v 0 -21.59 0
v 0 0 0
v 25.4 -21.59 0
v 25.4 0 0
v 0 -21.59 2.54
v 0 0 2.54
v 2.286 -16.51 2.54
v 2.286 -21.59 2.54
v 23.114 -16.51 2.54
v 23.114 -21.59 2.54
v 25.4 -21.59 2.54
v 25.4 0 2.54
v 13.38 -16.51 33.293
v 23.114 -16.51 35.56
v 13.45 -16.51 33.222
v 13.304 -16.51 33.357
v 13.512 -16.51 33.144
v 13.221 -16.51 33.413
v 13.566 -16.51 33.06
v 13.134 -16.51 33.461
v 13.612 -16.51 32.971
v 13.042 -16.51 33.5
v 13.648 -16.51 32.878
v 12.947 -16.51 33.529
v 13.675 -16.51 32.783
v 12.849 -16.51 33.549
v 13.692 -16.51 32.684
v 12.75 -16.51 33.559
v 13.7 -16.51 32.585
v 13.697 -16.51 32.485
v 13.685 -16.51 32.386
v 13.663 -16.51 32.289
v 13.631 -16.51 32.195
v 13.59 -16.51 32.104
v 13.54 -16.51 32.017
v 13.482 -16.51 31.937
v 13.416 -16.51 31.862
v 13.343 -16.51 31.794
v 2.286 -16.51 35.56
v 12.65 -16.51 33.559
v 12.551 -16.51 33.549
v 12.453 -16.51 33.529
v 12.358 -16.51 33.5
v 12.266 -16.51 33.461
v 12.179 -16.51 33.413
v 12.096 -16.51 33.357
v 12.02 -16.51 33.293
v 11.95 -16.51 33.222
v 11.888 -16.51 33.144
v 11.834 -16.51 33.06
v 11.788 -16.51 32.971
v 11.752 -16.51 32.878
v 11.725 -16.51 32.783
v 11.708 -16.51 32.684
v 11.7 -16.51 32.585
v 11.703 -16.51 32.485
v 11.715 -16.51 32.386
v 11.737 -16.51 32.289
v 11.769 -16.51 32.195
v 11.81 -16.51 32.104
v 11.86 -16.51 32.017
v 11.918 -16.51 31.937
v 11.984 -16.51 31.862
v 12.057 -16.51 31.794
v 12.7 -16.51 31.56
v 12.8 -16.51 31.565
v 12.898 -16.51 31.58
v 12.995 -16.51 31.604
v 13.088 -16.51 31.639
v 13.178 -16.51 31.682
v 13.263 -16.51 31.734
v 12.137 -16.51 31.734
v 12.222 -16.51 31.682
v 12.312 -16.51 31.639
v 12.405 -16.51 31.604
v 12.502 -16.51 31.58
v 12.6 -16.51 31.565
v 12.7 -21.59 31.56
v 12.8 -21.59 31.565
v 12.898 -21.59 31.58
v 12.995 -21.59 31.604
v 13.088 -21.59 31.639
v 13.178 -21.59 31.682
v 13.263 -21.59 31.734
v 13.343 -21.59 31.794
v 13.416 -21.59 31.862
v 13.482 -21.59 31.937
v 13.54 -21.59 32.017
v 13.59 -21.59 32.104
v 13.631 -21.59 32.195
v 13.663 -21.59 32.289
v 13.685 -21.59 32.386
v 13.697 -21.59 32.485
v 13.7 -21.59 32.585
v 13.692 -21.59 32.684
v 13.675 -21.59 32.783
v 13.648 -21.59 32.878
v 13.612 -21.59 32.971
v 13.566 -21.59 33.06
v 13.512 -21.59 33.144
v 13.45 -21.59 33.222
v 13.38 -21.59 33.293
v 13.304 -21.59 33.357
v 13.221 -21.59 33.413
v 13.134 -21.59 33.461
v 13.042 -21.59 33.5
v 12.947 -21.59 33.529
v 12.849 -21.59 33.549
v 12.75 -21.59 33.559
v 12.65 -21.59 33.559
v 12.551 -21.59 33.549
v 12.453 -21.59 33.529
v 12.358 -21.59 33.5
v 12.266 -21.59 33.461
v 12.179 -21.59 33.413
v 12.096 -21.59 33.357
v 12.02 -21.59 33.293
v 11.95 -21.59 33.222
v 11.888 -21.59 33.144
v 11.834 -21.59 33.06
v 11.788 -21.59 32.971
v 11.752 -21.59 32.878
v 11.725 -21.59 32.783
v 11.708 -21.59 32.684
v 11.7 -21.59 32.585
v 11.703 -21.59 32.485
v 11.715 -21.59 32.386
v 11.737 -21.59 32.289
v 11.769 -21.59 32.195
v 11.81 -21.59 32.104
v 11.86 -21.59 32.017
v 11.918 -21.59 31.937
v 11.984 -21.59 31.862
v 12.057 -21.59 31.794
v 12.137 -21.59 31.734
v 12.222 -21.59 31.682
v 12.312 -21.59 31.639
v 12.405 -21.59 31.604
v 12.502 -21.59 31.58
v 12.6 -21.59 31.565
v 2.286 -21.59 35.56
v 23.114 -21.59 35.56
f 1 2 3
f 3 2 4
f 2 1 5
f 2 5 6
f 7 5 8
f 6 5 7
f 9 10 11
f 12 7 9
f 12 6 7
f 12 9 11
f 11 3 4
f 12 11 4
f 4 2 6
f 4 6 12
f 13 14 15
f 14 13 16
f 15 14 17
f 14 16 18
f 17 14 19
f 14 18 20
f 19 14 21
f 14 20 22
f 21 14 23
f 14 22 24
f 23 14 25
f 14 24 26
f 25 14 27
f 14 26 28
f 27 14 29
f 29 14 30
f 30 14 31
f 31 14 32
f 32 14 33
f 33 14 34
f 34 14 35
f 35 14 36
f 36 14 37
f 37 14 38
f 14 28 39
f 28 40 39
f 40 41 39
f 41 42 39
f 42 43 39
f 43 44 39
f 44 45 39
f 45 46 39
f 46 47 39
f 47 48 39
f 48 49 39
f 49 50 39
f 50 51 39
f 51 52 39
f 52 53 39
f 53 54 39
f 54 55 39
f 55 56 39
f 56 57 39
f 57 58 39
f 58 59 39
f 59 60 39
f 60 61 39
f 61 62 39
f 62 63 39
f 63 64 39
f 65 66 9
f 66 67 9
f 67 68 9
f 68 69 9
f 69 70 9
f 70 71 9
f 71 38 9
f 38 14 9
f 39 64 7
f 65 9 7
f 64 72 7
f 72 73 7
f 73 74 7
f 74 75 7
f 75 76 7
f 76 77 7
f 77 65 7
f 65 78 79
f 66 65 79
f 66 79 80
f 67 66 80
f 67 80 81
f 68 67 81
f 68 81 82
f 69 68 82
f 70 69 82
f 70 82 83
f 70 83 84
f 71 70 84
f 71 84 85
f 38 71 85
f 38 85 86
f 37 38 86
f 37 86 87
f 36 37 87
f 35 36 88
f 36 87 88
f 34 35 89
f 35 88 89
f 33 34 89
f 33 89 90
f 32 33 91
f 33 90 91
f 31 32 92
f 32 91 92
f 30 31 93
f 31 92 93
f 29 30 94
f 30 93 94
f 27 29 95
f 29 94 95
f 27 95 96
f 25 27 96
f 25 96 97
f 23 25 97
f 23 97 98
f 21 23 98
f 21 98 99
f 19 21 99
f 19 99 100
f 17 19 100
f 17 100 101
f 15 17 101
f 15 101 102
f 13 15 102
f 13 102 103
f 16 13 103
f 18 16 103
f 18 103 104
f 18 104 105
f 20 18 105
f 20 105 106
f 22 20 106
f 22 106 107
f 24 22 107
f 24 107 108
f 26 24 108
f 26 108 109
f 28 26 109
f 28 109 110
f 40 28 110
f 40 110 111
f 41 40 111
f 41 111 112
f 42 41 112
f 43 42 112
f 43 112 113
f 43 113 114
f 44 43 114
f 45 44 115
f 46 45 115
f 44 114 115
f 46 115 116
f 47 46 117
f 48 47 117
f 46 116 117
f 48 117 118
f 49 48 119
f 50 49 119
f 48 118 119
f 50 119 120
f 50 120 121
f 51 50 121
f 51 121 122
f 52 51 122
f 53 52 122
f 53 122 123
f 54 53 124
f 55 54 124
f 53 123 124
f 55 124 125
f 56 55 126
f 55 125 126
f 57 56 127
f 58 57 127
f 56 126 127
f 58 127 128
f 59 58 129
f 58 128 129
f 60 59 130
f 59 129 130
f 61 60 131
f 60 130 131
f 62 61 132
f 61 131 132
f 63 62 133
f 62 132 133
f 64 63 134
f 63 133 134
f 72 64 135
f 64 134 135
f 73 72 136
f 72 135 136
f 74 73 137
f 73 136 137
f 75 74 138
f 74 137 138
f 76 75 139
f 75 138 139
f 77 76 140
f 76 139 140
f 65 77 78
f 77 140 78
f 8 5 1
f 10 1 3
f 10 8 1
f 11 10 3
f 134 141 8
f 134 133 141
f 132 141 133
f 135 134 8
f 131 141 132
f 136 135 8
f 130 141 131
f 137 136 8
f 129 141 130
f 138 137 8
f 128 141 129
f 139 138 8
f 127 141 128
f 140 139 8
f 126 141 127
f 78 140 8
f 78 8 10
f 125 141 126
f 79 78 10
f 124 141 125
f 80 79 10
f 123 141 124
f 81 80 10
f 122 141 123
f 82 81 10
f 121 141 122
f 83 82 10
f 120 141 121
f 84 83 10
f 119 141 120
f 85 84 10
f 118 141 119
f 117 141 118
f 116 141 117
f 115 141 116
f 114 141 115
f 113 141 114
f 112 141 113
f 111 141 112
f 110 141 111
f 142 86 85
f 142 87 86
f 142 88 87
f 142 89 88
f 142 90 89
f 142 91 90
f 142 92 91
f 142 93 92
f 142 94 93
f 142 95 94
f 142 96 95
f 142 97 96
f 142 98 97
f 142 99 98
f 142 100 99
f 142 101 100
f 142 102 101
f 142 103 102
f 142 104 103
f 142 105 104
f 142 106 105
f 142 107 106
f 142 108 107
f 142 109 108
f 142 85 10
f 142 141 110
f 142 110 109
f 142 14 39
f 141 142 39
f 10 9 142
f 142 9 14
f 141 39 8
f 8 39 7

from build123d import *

# Parameters (mm, degrees)
SKETCH1_W           = 25.4
SKETCH1_H           = 25.4
BOSS_EXTRUDE1_DEPTH = 2.54
BOSS_EXTRUDE3_DEPTH = 2.54
SKETCH6_W           = 25.4
SKETCH6_H           = 3.81
CUT_EXTRUDE1_DEPTH  = 51.545361805
SKETCH7_R           = 1
CUT_EXTRUDE2_DEPTH  = 49.742196298


with BuildPart() as part:
    # Sketch1 → Boss-Extrude1 (new body)
    with BuildSketch(Plane.XY):
        with Locations((12.7, -12.7)):
            Rectangle(SKETCH1_W, SKETCH1_H)
    extrude(amount=BOSS_EXTRUDE1_DEPTH)

    # Sketch2 → Boss-Extrude3 (add, symmetric)
    with BuildSketch(Plane(origin=(0, -19.05, 0), x_dir=(1, 0, 0), z_dir=(0, 1, 0))):
        Polygon((2.286, -35.56), (2.286, -2.54), (12.7, -2.54), (23.114, -2.54), (23.114, -35.56), align=None)
    extrude(amount=BOSS_EXTRUDE3_DEPTH, both=True)

    # Sketch6 → Cut-Extrude1 (cut, through all)
    with BuildSketch(Plane.XY.offset(35.56)):
        with Locations((12.7, -23.495)):
            Rectangle(SKETCH6_W, SKETCH6_H)
    extrude(amount=-CUT_EXTRUDE1_DEPTH, mode=Mode.SUBTRACT)

    # Sketch7 → Cut-Extrude2 (cut, through all)
    with BuildSketch(Plane(origin=(0, -21.59, 0), x_dir=(-1, 0, 0), z_dir=(0, -1, 0))):
        with Locations(Location((-12.7, -32.56, 0), (0, 0, 90))):
            Circle(SKETCH7_R)
    extrude(amount=-CUT_EXTRUDE2_DEPTH, mode=Mode.SUBTRACT)


solid = part.part
